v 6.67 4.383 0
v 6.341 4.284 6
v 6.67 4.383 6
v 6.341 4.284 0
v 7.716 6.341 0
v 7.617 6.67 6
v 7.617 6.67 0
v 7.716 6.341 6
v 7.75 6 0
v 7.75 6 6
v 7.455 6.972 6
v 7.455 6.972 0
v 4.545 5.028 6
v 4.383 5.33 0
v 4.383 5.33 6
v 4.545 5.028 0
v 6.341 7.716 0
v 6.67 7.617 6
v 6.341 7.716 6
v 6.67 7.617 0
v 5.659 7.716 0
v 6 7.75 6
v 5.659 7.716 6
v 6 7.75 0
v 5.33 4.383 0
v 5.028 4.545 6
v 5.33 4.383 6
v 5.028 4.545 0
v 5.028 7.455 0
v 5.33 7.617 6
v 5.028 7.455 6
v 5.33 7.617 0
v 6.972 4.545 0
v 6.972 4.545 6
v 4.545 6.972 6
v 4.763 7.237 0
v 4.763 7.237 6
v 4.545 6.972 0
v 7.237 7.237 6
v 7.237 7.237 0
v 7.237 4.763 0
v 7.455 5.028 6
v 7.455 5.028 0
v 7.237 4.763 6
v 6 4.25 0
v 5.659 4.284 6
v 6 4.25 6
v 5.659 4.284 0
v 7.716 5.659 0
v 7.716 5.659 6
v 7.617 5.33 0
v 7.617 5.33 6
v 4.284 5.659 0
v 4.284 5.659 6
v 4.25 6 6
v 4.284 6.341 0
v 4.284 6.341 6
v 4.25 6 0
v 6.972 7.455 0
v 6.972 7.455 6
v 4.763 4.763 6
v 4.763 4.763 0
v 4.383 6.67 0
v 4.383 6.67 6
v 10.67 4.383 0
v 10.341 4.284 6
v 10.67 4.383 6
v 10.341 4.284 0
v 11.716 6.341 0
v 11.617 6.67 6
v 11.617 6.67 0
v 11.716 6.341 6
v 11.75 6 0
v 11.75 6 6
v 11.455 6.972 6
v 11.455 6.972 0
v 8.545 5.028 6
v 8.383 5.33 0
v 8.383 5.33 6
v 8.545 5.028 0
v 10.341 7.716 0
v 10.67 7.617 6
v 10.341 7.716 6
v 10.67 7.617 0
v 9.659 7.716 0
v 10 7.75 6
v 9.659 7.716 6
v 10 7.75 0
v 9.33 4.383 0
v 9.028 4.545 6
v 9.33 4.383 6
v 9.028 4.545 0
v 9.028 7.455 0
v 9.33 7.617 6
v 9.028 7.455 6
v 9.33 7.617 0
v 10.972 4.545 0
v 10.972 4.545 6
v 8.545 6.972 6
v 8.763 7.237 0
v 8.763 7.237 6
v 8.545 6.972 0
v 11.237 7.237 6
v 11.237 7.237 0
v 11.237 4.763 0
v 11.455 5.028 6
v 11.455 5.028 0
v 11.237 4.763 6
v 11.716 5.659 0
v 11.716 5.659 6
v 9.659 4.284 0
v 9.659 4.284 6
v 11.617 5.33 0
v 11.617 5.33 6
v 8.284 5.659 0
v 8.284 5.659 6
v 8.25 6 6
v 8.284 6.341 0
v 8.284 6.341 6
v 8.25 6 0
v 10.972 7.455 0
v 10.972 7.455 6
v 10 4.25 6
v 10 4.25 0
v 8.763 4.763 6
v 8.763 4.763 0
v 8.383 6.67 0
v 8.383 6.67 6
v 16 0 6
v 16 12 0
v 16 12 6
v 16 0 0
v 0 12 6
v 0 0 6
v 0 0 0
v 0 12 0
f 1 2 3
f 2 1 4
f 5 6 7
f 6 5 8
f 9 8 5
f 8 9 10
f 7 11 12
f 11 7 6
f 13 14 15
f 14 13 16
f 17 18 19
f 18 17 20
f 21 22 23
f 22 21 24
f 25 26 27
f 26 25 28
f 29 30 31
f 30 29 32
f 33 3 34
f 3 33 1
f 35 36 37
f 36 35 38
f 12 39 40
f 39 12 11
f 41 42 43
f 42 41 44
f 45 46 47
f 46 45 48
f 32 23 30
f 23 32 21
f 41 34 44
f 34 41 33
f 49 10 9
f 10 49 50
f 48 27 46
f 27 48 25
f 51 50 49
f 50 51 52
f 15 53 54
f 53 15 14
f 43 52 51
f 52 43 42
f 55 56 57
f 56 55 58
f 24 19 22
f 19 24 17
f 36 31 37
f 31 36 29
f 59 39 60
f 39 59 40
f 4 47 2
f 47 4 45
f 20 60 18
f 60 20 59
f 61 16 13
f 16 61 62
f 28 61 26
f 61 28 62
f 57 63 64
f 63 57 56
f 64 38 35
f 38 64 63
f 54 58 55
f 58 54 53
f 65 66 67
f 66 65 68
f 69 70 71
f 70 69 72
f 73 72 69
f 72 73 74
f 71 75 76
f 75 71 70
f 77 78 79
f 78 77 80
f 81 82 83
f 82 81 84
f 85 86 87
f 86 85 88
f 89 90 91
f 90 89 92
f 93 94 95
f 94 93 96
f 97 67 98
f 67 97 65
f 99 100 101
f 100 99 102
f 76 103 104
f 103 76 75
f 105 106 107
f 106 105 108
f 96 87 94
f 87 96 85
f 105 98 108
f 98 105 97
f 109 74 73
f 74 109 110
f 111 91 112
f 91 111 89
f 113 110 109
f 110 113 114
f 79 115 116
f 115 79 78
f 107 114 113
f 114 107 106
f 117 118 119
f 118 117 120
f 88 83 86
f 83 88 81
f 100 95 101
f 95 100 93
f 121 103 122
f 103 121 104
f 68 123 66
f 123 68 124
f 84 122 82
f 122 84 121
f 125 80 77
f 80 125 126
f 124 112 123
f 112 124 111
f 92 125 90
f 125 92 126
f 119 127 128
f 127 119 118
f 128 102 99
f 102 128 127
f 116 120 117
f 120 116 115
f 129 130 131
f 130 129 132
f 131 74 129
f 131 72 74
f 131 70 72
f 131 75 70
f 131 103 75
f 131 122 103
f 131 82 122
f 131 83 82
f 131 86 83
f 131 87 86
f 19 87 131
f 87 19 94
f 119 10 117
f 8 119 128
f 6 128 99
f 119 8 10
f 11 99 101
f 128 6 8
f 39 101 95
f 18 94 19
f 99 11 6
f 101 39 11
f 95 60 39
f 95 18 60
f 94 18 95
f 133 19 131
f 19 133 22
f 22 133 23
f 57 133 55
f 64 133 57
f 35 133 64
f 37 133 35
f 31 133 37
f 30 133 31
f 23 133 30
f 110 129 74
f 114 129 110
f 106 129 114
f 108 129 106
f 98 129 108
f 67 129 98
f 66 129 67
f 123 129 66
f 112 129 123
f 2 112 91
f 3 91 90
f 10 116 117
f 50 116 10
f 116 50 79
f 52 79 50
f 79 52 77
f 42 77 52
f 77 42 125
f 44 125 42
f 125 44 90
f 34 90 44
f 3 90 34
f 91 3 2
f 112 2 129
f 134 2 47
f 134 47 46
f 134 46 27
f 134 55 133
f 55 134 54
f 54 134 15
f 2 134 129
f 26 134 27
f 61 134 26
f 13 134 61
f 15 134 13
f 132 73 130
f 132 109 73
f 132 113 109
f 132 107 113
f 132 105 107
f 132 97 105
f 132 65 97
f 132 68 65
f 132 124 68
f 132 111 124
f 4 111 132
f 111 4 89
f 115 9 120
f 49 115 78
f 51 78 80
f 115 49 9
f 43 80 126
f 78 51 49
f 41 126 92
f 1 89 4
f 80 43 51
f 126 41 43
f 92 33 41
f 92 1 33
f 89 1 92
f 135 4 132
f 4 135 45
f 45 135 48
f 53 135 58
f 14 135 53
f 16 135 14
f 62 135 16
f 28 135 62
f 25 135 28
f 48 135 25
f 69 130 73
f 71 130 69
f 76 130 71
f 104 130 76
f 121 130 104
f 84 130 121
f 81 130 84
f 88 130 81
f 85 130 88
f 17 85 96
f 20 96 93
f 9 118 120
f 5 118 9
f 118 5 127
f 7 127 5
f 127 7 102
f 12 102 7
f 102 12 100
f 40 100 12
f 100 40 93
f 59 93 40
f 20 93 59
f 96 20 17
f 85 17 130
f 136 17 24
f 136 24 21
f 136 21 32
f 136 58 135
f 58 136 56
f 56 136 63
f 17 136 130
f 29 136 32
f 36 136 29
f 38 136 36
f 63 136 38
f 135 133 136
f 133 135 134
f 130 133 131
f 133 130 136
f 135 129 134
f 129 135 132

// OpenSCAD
$fn = 32;

// ----------------------------------------------------------------------
// Micro pad: two-hole pad, 5-20 mm class
// ----------------------------------------------------------------------

// --- parameters (mm) ---
pad_l = 16;               // pad length, X
pad_w = 12;               // pad width, Y
pad_t = 6;                // pad thickness, Z
hole_d = 3.5;             // hole diameter
hole_x = 6;               // X of the first hole centre

difference() {
  cube([pad_l, pad_w, pad_t]);
  for (x = [hole_x, pad_l - hole_x])
    translate([x, pad_w / 2, -1])
      cylinder(h = pad_t + 2, d = hole_d);
}
